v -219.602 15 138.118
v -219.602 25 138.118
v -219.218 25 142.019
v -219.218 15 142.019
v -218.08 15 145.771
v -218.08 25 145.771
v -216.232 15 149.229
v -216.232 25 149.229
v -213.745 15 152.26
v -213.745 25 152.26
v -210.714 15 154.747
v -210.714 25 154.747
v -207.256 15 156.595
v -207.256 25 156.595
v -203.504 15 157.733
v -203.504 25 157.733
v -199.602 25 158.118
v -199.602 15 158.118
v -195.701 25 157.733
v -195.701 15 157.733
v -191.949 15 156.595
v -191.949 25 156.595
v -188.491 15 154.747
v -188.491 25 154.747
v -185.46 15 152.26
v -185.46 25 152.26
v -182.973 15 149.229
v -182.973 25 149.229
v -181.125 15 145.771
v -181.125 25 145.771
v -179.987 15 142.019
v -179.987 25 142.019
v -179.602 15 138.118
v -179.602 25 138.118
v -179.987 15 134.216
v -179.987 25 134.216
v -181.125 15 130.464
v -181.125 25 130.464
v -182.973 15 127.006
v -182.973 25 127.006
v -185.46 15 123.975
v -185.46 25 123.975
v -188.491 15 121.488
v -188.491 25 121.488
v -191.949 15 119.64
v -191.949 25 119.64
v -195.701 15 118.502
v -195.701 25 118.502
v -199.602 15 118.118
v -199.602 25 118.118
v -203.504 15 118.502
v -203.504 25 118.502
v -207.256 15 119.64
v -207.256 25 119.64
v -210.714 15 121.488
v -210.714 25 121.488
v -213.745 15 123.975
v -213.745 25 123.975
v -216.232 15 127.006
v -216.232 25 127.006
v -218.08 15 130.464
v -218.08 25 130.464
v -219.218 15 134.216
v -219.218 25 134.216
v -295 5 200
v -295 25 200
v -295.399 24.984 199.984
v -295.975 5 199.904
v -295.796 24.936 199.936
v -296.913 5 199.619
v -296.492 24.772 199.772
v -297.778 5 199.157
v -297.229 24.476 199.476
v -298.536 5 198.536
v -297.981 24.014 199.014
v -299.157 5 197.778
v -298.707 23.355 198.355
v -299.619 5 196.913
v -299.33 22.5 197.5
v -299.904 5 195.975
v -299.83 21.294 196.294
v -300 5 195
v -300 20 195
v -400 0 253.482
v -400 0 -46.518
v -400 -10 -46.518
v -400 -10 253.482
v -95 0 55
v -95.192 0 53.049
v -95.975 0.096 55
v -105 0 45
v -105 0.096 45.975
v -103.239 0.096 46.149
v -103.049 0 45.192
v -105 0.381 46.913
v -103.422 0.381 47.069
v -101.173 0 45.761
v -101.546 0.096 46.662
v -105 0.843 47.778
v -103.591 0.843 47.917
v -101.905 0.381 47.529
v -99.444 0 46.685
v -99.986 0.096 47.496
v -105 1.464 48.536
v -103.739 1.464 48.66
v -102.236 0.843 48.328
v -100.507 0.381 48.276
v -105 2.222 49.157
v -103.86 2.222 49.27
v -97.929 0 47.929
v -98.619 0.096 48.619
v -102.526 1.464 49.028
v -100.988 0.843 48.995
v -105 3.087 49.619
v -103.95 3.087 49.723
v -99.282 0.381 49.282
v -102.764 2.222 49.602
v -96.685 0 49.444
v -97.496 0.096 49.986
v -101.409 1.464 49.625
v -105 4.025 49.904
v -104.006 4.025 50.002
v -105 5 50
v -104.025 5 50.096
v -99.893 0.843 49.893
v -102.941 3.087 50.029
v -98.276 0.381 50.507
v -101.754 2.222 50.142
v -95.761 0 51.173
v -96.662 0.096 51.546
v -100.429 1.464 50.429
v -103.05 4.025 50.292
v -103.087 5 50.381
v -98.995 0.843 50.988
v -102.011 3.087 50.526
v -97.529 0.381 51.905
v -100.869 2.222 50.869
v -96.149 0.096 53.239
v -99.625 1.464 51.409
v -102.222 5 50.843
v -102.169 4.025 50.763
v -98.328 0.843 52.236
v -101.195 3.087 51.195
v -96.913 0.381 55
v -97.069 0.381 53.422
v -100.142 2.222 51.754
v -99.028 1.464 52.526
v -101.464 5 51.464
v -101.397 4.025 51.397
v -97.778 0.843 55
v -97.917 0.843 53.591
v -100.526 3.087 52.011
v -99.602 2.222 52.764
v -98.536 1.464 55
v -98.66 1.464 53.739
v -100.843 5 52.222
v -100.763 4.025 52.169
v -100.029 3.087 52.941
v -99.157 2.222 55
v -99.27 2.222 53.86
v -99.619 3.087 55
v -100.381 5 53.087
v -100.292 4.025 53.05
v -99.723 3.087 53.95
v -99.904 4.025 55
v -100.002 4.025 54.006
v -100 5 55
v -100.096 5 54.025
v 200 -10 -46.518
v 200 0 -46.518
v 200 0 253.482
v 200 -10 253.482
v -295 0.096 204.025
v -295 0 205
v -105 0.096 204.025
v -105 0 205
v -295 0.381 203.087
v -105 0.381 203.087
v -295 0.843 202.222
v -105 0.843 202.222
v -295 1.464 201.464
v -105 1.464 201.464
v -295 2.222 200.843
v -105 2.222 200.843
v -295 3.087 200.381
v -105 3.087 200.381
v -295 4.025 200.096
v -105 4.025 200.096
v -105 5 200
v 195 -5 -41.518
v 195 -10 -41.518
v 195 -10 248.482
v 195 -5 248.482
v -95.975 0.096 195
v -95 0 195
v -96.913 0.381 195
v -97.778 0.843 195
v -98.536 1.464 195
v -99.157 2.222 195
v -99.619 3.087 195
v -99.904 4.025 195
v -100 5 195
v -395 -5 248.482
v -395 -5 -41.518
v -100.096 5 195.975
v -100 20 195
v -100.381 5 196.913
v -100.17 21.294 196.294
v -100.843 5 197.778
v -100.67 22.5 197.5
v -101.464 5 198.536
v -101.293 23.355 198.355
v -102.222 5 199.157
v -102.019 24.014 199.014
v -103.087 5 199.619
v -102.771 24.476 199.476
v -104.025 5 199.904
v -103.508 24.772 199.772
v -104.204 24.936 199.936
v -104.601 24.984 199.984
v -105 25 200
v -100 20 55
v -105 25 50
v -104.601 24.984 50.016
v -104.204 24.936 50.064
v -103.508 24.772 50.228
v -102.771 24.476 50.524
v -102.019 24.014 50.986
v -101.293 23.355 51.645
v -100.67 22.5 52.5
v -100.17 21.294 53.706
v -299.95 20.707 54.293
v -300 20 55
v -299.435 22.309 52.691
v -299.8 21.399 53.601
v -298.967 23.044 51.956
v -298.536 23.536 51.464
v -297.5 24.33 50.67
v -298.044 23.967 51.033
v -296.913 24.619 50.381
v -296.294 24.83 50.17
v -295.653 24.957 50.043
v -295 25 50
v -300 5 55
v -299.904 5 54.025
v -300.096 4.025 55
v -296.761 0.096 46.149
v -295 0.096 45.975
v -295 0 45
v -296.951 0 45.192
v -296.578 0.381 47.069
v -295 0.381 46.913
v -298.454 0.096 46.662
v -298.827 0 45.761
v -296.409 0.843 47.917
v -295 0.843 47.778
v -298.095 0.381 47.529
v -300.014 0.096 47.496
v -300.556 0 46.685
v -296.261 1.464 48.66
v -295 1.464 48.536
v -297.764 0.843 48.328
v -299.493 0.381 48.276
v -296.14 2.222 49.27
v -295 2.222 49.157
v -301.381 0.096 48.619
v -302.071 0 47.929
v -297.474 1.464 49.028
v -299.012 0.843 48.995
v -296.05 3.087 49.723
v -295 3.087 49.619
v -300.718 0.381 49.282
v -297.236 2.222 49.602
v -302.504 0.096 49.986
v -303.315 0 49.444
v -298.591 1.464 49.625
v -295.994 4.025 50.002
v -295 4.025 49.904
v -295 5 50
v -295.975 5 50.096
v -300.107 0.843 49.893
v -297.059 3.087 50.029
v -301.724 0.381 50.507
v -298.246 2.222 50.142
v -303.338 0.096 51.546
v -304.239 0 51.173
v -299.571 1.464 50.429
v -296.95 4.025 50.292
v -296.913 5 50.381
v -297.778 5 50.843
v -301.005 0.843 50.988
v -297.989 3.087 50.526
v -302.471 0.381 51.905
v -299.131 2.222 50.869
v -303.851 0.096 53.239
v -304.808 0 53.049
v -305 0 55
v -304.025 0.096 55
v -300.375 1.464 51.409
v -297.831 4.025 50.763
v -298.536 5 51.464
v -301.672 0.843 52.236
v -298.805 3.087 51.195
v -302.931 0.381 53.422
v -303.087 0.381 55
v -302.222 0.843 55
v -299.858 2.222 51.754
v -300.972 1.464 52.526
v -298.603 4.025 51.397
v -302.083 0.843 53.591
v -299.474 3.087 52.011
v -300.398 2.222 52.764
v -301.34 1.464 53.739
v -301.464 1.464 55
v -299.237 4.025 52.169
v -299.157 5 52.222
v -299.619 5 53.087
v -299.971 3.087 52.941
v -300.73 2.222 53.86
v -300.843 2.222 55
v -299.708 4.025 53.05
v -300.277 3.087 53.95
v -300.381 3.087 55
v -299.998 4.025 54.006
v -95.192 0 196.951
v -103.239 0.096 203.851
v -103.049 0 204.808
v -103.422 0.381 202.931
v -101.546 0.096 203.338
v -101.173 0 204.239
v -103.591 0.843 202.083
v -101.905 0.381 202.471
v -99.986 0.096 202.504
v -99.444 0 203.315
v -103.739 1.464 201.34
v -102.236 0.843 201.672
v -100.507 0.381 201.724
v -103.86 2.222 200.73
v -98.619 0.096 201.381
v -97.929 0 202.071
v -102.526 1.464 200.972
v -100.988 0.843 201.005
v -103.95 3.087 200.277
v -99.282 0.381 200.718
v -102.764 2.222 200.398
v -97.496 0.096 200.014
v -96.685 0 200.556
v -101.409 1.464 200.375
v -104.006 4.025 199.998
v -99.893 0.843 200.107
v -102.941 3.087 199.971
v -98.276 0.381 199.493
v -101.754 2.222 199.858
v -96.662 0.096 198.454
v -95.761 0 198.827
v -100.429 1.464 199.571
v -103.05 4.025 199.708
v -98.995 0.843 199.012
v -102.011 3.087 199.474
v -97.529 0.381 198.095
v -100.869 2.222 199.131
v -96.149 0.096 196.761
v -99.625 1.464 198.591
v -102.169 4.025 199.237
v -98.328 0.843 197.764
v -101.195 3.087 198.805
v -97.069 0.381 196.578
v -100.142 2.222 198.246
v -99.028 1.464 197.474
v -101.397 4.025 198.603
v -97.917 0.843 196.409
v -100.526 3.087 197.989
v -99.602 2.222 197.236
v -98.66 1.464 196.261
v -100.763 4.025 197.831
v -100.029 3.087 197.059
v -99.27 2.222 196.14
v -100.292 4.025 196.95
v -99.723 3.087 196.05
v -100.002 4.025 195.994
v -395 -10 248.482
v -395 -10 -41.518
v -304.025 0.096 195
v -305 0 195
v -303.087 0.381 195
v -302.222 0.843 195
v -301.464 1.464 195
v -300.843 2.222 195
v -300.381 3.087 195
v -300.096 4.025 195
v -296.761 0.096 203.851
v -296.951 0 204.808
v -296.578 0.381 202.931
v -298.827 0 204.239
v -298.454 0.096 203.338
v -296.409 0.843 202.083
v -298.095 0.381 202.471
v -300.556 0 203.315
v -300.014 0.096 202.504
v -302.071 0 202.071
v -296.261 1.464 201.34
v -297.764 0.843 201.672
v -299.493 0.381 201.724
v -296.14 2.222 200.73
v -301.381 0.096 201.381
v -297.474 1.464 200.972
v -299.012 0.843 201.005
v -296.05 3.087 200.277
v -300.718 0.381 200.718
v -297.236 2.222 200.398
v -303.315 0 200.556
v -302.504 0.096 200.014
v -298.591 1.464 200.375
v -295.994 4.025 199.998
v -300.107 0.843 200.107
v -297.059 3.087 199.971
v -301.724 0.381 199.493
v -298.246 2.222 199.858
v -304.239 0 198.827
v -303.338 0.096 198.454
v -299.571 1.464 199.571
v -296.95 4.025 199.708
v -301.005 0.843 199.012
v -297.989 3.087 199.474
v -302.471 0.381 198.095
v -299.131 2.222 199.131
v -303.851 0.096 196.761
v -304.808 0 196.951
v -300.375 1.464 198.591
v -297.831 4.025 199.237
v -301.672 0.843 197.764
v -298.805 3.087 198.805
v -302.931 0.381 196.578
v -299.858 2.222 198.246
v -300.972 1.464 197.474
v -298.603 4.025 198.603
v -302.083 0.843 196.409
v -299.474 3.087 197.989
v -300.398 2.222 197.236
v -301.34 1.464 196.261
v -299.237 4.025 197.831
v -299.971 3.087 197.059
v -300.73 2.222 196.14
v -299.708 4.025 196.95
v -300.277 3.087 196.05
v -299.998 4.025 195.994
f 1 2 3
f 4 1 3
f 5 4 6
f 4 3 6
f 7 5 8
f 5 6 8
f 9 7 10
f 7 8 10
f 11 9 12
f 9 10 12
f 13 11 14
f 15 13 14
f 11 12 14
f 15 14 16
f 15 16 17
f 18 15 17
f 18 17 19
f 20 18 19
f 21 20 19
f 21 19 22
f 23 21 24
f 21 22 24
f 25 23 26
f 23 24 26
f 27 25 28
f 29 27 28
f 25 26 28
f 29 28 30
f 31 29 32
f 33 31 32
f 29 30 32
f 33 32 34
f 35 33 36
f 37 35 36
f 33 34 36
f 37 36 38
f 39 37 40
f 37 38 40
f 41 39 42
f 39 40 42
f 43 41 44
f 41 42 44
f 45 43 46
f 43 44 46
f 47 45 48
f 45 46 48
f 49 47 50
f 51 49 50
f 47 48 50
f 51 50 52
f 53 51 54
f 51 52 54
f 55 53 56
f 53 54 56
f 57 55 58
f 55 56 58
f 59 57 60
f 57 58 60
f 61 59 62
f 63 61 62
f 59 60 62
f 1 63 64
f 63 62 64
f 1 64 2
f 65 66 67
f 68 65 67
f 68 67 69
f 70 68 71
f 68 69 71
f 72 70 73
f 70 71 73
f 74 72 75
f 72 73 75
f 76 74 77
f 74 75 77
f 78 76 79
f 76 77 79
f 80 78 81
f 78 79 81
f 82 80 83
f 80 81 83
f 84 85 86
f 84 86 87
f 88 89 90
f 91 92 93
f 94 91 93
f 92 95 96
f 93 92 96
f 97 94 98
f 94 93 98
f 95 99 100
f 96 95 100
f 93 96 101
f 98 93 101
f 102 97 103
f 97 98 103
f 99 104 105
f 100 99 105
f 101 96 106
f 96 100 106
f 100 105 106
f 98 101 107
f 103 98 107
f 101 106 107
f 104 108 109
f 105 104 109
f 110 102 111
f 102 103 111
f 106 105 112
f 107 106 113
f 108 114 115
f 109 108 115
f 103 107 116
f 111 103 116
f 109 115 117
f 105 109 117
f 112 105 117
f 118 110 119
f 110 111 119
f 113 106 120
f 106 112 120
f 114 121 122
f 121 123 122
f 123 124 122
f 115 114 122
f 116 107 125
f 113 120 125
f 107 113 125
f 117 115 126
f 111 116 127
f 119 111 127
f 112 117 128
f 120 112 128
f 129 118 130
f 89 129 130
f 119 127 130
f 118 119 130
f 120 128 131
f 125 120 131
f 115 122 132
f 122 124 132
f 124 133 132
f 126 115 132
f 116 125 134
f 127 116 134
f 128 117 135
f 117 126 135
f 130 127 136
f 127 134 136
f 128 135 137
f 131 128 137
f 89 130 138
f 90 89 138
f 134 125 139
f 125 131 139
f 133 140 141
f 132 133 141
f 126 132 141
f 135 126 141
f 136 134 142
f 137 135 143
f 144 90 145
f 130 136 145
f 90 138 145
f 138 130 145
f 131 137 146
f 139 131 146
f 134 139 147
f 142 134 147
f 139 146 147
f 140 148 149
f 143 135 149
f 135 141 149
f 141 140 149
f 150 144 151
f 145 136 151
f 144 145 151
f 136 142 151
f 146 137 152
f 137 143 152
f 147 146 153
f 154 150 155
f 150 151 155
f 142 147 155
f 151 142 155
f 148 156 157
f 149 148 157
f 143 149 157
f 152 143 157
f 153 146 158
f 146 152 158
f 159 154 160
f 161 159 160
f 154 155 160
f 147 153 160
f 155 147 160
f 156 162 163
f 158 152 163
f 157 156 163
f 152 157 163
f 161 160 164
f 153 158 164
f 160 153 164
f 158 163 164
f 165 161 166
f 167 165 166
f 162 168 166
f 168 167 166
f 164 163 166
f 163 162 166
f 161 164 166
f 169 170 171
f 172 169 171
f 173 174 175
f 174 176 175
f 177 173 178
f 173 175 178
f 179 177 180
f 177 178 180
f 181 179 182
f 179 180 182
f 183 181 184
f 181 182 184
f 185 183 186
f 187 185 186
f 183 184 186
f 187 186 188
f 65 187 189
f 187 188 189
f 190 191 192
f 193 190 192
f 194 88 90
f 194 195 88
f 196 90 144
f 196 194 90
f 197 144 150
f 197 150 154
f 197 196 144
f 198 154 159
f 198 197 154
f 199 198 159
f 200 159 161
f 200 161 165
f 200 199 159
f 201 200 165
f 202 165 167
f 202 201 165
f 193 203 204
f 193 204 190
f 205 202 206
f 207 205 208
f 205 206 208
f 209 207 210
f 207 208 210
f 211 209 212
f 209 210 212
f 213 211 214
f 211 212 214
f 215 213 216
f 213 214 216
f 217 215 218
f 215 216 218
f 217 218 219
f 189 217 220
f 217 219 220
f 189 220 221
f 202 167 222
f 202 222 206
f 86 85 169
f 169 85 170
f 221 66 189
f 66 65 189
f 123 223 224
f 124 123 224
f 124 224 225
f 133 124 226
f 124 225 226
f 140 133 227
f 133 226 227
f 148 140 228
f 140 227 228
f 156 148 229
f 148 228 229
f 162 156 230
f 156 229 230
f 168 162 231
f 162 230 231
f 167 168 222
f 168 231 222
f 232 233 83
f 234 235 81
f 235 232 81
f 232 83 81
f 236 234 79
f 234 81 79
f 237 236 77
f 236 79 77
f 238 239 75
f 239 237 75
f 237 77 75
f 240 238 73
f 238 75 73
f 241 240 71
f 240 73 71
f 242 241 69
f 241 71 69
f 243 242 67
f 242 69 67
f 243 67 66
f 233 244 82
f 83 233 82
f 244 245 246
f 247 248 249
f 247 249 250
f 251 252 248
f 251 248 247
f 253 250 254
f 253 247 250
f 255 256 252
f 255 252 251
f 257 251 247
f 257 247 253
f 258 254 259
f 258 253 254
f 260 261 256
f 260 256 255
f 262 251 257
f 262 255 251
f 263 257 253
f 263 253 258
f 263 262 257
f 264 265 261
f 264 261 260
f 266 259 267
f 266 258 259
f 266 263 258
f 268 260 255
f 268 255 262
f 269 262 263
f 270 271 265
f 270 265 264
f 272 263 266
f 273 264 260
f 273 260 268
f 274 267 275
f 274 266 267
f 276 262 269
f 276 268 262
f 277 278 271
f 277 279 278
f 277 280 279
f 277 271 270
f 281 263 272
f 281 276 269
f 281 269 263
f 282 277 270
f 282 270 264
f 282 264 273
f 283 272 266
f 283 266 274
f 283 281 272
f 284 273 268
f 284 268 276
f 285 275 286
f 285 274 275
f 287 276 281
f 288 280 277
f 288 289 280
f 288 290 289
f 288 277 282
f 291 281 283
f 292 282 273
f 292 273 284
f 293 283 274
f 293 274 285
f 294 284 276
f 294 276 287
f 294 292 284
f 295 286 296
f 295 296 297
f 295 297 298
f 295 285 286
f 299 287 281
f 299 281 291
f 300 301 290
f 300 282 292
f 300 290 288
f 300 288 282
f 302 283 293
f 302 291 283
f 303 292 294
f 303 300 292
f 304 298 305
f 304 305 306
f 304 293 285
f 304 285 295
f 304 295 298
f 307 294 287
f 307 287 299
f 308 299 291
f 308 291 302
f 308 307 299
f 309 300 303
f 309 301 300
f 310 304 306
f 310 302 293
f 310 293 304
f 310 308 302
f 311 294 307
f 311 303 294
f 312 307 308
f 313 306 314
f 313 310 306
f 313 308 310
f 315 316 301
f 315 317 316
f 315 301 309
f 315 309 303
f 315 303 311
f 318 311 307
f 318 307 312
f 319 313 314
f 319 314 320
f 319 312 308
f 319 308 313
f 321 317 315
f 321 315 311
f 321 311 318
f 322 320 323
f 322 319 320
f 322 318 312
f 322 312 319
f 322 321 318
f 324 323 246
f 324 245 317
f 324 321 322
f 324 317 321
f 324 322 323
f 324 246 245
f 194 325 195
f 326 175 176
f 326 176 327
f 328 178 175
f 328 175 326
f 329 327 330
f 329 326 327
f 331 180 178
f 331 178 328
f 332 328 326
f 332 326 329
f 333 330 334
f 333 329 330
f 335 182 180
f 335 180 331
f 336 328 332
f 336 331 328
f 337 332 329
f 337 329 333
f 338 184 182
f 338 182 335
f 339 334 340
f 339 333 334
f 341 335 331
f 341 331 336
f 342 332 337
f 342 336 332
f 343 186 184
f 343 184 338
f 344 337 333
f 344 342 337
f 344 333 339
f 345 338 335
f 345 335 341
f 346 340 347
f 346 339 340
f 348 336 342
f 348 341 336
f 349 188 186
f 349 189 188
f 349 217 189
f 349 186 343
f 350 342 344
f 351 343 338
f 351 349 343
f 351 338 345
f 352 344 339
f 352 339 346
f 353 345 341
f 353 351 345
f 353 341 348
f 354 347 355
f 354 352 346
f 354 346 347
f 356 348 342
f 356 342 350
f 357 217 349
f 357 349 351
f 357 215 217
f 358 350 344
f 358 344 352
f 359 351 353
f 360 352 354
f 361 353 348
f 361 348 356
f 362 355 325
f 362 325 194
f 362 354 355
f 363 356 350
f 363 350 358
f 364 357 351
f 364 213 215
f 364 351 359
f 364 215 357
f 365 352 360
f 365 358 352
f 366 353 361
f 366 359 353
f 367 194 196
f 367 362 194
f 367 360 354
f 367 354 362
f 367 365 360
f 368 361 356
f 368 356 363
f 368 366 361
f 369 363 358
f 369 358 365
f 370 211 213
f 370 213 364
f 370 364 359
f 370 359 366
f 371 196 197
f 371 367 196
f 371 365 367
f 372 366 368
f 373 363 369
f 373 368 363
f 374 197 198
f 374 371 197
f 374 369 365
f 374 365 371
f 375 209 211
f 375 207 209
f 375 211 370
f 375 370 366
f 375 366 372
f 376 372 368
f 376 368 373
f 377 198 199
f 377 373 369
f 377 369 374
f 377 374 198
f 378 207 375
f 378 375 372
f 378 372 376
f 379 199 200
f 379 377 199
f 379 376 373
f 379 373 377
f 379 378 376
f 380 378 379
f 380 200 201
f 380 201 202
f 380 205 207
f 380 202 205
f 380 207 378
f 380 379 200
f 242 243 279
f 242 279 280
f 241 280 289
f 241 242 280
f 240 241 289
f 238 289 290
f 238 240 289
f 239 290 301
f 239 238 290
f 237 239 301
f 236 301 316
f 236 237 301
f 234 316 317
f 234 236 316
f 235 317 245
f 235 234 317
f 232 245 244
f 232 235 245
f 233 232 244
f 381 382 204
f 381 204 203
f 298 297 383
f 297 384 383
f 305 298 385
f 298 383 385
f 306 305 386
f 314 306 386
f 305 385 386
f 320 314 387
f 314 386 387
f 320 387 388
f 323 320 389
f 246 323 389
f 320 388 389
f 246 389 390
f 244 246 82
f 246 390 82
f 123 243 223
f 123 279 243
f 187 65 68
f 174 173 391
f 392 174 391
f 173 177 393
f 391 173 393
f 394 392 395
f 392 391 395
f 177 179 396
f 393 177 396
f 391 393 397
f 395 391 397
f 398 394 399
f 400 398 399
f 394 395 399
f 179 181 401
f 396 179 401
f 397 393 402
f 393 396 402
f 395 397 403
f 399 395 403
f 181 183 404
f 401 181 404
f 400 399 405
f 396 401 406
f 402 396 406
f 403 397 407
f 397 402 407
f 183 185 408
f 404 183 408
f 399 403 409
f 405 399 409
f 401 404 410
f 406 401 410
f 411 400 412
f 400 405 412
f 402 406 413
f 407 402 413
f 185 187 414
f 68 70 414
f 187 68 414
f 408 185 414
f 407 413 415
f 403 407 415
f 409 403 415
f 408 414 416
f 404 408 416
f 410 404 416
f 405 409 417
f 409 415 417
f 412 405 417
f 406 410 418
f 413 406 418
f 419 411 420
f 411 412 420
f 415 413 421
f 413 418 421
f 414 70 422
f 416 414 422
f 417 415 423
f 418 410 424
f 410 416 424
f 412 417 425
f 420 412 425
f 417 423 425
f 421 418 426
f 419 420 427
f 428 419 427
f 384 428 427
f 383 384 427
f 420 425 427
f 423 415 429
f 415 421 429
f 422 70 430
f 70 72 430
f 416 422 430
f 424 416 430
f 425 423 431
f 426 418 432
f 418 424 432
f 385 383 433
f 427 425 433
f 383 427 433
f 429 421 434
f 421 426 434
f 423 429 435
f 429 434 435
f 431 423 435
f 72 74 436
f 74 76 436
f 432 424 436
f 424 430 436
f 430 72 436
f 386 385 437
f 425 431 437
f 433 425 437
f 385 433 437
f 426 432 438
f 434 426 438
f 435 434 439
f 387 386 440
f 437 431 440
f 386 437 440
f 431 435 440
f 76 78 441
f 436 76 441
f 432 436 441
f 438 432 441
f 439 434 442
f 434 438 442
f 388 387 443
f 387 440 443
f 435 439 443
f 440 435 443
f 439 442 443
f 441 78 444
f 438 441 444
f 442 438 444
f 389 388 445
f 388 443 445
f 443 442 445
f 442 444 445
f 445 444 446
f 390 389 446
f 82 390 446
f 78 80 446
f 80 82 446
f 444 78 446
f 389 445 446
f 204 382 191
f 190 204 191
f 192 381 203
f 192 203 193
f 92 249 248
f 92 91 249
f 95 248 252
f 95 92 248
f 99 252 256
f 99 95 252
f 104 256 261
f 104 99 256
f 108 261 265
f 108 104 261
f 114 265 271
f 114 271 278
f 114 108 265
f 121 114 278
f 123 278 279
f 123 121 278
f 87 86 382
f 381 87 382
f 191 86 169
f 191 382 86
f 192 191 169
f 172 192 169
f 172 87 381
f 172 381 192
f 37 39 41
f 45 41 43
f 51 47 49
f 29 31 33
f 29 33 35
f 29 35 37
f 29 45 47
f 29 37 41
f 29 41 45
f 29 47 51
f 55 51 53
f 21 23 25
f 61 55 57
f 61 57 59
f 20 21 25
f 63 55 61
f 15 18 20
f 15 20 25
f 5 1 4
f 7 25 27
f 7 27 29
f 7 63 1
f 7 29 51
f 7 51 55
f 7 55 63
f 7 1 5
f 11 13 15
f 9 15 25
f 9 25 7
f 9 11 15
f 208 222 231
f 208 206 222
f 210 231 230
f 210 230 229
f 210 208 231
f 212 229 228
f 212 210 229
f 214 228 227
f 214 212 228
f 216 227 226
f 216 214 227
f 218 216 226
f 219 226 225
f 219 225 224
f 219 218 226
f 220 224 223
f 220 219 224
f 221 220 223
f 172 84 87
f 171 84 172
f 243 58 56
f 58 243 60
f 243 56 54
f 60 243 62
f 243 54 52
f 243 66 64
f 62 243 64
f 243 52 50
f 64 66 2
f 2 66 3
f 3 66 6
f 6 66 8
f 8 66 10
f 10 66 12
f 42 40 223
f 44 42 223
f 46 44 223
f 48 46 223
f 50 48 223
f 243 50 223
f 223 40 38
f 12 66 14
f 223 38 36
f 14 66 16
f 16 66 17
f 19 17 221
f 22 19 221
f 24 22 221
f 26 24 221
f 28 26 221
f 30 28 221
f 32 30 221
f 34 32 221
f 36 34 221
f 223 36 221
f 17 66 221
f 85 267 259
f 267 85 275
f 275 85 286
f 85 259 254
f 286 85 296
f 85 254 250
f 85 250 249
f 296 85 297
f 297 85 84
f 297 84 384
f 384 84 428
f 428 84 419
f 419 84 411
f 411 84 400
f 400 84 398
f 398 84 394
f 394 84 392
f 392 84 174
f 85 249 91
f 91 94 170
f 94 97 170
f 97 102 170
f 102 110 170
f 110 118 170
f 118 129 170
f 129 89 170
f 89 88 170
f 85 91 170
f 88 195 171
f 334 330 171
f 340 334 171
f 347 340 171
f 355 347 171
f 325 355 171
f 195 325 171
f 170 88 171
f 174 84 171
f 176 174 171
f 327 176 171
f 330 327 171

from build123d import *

# Parameters (mm, degrees)
F0_W     = 600
F0_H     = 300
F1_DEPTH = 10
F2_W     = 590.0000214577
F2_H     = 290.0000214577
F3_DEPTH = 5
F4_W     = 200
F4_H     = 150
F5_DEPTH = 30
F6_R     = 5
F7_R     = 20
F8_DEPTH = 10


with BuildPart() as f1:
    # F0 (on Front) → F1 (new body)
    with BuildSketch(Plane.XZ):
        with Locations((-100, 103.4820094705)):
            Rectangle(F0_W, F0_H)
    extrude(amount=F1_DEPTH)

    # F2 (on face) → F3 (cut)
    with BuildSketch(Plane.XZ.offset(10)):
        with Locations((-100, 103.4820094705)):
            Rectangle(F2_W, F2_H)
    extrude(amount=-F3_DEPTH, mode=Mode.SUBTRACT)

    # F4 (on face) → F5 (join)
    with BuildSketch(Plane.XZ.offset(5)):
        with Locations((-200, 125)):
            Rectangle(F4_W, F4_H)
    extrude(amount=-F5_DEPTH)

    # F6
    f6_edges = [f1.edges().sort_by_distance(p)[0] for p in [
        (-100, 0, 125),
        (-100, 12.5, 200),
        (-100, 25, 125),
        (-100, 12.5, 50),
        (-300, 0, 125),
        (-300, 12.5, 50),
        (-300, 25, 125),
        (-300, 12.5, 200),
        (-200, 0, 200),
        (-200, 0, 50),
    ]]
    fillet(f6_edges, radius=F6_R)

    # F7 (on face) → F8 (cut)
    with BuildSketch(Plane(origin=(0, 25, 0), x_dir=(-1, 0, 0), z_dir=(0, 1, 0))):
        with Locations((199.6024996042, 138.1175220013)):
            Circle(F7_R)
    extrude(amount=-F8_DEPTH, mode=Mode.SUBTRACT)


solid = f1.part
